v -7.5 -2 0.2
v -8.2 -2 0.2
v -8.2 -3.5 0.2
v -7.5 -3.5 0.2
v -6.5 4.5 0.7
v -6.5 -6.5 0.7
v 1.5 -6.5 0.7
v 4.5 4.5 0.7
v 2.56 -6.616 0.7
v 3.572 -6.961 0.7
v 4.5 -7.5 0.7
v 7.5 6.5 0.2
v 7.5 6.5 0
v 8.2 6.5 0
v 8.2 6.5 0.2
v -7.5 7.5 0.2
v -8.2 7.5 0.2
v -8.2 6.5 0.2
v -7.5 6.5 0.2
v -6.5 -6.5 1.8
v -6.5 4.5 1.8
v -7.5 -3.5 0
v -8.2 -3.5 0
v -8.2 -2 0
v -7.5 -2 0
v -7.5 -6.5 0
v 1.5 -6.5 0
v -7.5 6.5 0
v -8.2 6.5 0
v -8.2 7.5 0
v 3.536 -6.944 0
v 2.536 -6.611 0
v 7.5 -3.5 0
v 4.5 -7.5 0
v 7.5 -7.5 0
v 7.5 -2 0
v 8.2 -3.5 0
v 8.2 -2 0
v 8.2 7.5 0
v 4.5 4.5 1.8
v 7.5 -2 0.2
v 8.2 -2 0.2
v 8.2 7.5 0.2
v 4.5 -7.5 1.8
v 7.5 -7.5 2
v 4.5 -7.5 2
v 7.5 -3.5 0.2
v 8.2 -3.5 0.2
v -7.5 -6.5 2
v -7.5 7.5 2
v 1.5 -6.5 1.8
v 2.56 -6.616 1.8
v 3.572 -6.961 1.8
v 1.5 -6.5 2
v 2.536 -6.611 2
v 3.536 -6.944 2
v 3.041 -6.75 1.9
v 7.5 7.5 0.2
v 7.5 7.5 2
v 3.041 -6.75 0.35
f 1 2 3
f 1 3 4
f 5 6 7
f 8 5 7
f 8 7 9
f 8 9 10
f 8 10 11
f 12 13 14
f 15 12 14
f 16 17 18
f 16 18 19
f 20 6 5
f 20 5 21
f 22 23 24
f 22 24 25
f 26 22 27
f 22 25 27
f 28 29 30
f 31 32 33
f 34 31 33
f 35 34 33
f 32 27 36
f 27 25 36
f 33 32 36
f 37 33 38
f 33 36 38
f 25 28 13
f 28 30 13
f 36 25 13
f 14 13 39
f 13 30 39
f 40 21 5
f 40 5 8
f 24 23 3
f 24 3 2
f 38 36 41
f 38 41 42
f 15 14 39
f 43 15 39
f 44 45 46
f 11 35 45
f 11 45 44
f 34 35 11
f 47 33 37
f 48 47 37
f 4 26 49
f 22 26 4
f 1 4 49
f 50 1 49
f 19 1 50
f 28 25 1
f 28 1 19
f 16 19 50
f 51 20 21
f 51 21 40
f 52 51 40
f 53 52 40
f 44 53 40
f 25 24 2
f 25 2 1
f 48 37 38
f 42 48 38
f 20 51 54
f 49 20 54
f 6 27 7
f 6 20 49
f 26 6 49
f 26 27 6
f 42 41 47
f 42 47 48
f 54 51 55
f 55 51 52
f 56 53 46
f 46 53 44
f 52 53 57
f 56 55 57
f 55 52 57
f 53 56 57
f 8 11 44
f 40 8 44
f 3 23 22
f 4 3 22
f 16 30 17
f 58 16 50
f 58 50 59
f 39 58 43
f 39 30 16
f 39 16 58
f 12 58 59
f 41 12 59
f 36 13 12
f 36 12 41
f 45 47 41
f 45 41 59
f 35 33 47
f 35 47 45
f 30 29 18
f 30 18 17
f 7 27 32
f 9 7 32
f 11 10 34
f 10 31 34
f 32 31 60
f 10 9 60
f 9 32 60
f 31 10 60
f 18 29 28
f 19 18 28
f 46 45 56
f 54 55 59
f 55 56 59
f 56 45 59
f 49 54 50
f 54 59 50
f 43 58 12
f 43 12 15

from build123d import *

# Parameters (mm, degrees)
BOSS_EXTRUDE1_DEPTH = 2
SKETCH2_W           = 11
SKETCH2_H           = 1.1
CUT_EXTRUDE1_DEPTH  = 12
SKETCH3_W           = 0.7
SKETCH3_H           = 1
SKETCH3_H_2         = 1.5
BOSS_EXTRUDE2_DEPTH = 0.2


with BuildPart() as part:
    # Sketch1 → Boss-Extrude1 (new body)
    with BuildSketch(Plane.XY):
        with BuildLine():
            Line((-7.5, 7.5), (7.5, 7.5))
            Line((7.5, 7.5), (7.5, -7.5))
            Line((7.5, -7.5), (4.5, -7.5))
            add(Edge.make_bspline(
                [(1.5, -6.5), (3.08113883, -6.5), (4.5, -7.5)],
                knots=[0, 0, 0, 1, 1, 1], degree=2))
            Line((1.5, -6.5), (-7.5, -6.5))
            Line((-7.5, -6.5), (-7.5, 7.5))
        make_face()
    extrude(amount=BOSS_EXTRUDE1_DEPTH)

    # Sketch2 → Cut-Extrude1 (cut)
    with BuildSketch(Plane.XZ.offset(7.5)):
        with Locations((-1, 1.25)):
            Rectangle(SKETCH2_W, SKETCH2_H)
    extrude(amount=-CUT_EXTRUDE1_DEPTH, mode=Mode.SUBTRACT)

    # Sketch3 → Boss-Extrude2 (add)
    with BuildSketch(Plane.XY):
        with Locations((7.85, 7)):
            Rectangle(SKETCH3_W, SKETCH3_H)
        with Locations((-7.85, 7)):
            Rectangle(SKETCH3_W, SKETCH3_H)
        with Locations((-7.85, -2.75)):
            Rectangle(SKETCH3_W, SKETCH3_H_2)
        with Locations((7.85, -2.75)):
            Rectangle(SKETCH3_W, SKETCH3_H_2)
    extrude(amount=BOSS_EXTRUDE2_DEPTH)


solid = part.part
